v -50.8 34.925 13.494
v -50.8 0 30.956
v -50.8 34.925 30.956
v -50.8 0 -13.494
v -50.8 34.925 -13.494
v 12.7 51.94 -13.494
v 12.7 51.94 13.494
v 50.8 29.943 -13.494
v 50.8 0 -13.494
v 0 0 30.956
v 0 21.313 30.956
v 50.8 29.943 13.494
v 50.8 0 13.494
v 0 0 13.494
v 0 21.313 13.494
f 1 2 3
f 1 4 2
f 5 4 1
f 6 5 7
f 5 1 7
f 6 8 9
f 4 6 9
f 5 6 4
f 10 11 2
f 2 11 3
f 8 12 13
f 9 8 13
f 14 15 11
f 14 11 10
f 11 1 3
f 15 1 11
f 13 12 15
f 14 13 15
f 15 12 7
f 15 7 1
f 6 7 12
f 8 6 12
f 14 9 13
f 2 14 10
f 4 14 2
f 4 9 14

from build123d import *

# Parameters (mm, degrees)
BOSS_EXTRUDE1_DEPTH = 13.49375
BOSS_EXTRUDE2_DEPTH = 17.4625


with BuildPart() as part:
    # Sketch1 → Boss-Extrude1 (new body, symmetric)
    with BuildSketch(Plane.XY):
        Polygon((50.8, 0), (-50.8, 0), (-50.8, 34.925), (12.7, 51.939773719), (50.8, 29.942728463), align=None)
    extrude(amount=BOSS_EXTRUDE1_DEPTH, both=True)

    # Sketch2 → Boss-Extrude2 (add)
    with BuildSketch(Plane.XY.offset(13.49375)):
        Polygon((-50.8, 0), (-50.8, 34.925), (0, 21.313181024), (0, 0), align=None)
    extrude(amount=BOSS_EXTRUDE2_DEPTH)


solid = part.part
